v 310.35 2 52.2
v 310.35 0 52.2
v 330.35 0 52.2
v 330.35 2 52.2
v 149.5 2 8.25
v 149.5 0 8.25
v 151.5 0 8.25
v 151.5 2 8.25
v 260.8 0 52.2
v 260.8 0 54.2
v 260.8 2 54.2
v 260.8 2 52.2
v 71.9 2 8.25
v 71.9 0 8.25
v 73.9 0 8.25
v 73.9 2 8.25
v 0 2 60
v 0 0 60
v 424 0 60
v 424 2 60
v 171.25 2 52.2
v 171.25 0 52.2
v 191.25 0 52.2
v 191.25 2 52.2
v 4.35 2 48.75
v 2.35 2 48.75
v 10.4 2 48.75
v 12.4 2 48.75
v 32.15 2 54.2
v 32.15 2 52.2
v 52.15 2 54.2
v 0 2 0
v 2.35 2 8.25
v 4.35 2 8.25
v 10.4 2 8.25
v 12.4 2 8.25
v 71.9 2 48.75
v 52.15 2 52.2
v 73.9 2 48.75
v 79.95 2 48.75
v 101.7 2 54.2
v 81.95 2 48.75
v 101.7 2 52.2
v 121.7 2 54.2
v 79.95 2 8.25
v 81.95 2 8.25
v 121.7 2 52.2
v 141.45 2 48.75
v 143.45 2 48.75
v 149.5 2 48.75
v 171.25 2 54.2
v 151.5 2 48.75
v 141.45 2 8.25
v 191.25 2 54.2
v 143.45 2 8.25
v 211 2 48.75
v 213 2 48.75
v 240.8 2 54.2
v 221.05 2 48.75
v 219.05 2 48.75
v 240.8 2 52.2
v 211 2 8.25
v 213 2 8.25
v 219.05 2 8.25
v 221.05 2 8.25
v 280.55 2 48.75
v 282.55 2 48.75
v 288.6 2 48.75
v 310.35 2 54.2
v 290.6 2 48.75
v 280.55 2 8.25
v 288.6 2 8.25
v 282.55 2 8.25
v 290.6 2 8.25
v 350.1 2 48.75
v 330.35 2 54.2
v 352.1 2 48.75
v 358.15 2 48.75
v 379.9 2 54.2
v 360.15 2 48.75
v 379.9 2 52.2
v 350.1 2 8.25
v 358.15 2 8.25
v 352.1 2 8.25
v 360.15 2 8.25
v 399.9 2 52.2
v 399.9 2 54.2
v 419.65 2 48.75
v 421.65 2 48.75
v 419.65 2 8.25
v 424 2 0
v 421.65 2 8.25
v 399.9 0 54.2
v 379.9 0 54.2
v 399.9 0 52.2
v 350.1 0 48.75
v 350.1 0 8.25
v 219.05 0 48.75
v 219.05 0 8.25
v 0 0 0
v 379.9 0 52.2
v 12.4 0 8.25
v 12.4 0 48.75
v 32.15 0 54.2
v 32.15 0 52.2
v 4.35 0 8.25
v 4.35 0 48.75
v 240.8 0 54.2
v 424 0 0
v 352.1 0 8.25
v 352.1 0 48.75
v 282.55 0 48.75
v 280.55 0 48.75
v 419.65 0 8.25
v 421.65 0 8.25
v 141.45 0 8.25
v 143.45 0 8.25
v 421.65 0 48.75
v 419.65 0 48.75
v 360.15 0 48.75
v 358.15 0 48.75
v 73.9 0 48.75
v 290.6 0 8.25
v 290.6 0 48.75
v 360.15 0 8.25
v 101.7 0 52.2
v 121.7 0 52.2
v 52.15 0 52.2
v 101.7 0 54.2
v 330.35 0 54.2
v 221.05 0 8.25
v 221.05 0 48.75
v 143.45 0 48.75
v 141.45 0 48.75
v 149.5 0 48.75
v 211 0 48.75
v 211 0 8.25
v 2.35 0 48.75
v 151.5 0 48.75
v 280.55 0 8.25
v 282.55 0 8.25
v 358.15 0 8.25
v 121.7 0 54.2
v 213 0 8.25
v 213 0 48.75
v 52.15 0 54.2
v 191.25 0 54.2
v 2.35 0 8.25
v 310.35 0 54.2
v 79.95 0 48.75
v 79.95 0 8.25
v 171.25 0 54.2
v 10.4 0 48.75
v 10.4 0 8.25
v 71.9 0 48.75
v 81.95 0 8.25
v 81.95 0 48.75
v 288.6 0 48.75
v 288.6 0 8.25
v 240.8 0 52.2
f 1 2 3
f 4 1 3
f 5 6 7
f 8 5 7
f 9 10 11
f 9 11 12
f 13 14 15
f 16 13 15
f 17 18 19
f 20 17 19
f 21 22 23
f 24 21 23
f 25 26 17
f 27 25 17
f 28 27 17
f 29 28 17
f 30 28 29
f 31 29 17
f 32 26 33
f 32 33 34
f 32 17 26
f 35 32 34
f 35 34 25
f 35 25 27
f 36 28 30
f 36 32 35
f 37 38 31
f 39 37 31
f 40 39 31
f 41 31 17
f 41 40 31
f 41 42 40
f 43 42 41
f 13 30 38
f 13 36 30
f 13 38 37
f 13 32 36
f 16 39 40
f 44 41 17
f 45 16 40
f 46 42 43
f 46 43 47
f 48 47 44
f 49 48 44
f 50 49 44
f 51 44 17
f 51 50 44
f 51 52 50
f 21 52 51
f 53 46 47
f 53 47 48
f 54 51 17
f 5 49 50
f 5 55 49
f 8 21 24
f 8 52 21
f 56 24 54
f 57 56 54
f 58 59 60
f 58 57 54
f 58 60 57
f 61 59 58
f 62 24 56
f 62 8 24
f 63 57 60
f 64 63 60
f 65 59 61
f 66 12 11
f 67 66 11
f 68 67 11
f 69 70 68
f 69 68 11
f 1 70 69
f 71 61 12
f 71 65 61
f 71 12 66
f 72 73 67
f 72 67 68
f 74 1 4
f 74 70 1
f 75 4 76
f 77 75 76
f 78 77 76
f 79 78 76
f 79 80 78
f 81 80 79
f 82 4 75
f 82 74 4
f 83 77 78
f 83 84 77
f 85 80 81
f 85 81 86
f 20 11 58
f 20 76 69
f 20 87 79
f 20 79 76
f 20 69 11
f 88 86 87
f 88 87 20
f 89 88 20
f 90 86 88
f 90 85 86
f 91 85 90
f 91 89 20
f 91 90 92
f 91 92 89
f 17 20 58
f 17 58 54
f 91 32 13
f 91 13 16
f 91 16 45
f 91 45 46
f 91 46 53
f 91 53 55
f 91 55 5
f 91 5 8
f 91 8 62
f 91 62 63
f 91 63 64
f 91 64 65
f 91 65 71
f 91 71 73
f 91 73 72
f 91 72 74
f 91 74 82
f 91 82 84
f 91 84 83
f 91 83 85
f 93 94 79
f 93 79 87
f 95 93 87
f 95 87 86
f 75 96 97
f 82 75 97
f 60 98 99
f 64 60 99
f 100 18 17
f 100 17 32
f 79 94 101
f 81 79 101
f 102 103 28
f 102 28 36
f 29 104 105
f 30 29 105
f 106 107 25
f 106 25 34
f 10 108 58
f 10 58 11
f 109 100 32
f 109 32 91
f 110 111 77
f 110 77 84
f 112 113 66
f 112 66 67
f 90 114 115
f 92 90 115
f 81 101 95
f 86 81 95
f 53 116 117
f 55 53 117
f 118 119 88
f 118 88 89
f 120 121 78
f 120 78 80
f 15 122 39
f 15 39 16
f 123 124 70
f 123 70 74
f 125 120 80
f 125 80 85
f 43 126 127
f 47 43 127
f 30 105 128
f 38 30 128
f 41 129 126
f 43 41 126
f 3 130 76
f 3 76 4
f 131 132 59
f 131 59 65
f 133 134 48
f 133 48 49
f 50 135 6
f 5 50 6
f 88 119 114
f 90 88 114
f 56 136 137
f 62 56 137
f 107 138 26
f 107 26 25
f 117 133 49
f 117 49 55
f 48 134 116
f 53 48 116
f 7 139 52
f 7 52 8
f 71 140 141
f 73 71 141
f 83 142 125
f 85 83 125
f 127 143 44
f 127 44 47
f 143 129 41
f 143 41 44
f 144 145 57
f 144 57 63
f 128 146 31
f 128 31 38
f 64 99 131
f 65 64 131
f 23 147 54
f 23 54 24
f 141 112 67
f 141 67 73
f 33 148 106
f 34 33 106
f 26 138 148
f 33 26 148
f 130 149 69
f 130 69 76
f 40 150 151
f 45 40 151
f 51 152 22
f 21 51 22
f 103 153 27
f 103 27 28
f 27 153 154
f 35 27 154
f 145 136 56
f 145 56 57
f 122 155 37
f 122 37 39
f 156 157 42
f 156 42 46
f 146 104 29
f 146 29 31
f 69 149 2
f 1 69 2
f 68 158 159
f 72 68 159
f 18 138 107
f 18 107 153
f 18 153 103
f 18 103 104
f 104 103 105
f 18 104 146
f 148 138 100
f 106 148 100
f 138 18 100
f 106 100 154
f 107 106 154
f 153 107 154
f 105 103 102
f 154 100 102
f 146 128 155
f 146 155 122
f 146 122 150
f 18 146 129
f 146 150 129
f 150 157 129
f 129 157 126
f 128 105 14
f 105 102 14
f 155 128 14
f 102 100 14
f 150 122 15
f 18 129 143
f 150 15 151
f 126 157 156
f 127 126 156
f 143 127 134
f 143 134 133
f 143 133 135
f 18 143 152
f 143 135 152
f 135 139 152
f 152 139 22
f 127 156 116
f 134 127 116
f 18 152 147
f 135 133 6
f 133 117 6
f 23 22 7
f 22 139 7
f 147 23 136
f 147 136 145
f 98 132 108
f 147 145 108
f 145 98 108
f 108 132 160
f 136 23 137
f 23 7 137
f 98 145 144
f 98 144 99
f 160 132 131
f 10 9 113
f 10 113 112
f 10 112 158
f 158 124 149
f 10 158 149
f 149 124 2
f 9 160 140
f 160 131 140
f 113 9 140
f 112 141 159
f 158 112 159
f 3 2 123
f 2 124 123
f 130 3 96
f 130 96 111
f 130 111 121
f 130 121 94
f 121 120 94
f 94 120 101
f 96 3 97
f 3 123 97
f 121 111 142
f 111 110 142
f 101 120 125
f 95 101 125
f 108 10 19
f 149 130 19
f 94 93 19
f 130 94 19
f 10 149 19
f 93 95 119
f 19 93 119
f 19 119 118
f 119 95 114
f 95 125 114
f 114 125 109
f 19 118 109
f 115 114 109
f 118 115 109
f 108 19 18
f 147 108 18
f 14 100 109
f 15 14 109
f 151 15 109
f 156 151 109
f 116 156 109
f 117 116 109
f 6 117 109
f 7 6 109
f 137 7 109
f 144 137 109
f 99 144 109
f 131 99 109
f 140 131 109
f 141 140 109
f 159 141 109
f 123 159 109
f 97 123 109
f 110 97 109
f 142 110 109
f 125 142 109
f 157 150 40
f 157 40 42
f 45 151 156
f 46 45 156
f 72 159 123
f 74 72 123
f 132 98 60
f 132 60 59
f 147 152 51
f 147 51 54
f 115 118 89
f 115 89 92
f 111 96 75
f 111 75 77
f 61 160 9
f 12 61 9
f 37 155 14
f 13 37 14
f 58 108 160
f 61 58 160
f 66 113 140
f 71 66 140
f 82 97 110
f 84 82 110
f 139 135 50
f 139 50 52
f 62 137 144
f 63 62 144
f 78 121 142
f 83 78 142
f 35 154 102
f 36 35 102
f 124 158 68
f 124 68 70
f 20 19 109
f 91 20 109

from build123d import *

# Parameters (mm, degrees)
SKETCH1_W           = 424
SKETCH1_H           = 60
SKETCH1_W_2         = 2
SKETCH1_H_2         = 40.5
SKETCH1_W_3         = 20
SKETCH1_H_3         = 2
BOSS_EXTRUDE2_DEPTH = 2


with BuildPart() as part:
    # Sketch1 → Boss-Extrude2 (new body)
    with BuildSketch(Plane(origin=(0, 0, 0), x_dir=(1, 0, 0), z_dir=(0, 1, 0))):
        with Locations((212, -30)):
            Rectangle(SKETCH1_W, SKETCH1_H)
        with Locations((80.95, -28.5)):
            Rectangle(SKETCH1_W_2, SKETCH1_H_2, mode=Mode.SUBTRACT)
        with Locations((150.5, -28.5)):
            Rectangle(SKETCH1_W_2, SKETCH1_H_2, mode=Mode.SUBTRACT)
        with Locations((3.35, -28.5)):
            Rectangle(SKETCH1_W_2, SKETCH1_H_2, mode=Mode.SUBTRACT)
        with Locations((72.9, -28.5)):
            Rectangle(SKETCH1_W_2, SKETCH1_H_2, mode=Mode.SUBTRACT)
        with Locations((11.4, -28.5)):
            Rectangle(SKETCH1_W_2, SKETCH1_H_2, mode=Mode.SUBTRACT)
        with Locations((359.15, -28.5)):
            Rectangle(SKETCH1_W_2, SKETCH1_H_2, mode=Mode.SUBTRACT)
        with Locations((351.1, -28.5)):
            Rectangle(SKETCH1_W_2, SKETCH1_H_2, mode=Mode.SUBTRACT)
        with Locations((289.6, -28.5)):
            Rectangle(SKETCH1_W_2, SKETCH1_H_2, mode=Mode.SUBTRACT)
        with Locations((220.05, -28.5)):
            Rectangle(SKETCH1_W_2, SKETCH1_H_2, mode=Mode.SUBTRACT)
        with Locations((142.45, -28.5)):
            Rectangle(SKETCH1_W_2, SKETCH1_H_2, mode=Mode.SUBTRACT)
        with Locations((111.7, -53.2)):
            Rectangle(SKETCH1_W_3, SKETCH1_H_3, mode=Mode.SUBTRACT)
        with Locations((42.15, -53.2)):
            Rectangle(SKETCH1_W_3, SKETCH1_H_3, mode=Mode.SUBTRACT)
        with Locations((212, -28.5)):
            Rectangle(SKETCH1_W_2, SKETCH1_H_2, mode=Mode.SUBTRACT)
        with Locations((281.55, -28.5)):
            Rectangle(SKETCH1_W_2, SKETCH1_H_2, mode=Mode.SUBTRACT)
        with Locations((181.25, -53.2)):
            Rectangle(SKETCH1_W_3, SKETCH1_H_3, mode=Mode.SUBTRACT)
        with Locations((250.8, -53.2)):
            Rectangle(SKETCH1_W_3, SKETCH1_H_3, mode=Mode.SUBTRACT)
        with Locations((420.65, -28.5)):
            Rectangle(SKETCH1_W_2, SKETCH1_H_2, mode=Mode.SUBTRACT)
        with Locations((320.35, -53.2)):
            Rectangle(SKETCH1_W_3, SKETCH1_H_3, mode=Mode.SUBTRACT)
        with Locations((389.9, -53.2)):
            Rectangle(SKETCH1_W_3, SKETCH1_H_3, mode=Mode.SUBTRACT)
    extrude(amount=BOSS_EXTRUDE2_DEPTH)


solid = part.part
